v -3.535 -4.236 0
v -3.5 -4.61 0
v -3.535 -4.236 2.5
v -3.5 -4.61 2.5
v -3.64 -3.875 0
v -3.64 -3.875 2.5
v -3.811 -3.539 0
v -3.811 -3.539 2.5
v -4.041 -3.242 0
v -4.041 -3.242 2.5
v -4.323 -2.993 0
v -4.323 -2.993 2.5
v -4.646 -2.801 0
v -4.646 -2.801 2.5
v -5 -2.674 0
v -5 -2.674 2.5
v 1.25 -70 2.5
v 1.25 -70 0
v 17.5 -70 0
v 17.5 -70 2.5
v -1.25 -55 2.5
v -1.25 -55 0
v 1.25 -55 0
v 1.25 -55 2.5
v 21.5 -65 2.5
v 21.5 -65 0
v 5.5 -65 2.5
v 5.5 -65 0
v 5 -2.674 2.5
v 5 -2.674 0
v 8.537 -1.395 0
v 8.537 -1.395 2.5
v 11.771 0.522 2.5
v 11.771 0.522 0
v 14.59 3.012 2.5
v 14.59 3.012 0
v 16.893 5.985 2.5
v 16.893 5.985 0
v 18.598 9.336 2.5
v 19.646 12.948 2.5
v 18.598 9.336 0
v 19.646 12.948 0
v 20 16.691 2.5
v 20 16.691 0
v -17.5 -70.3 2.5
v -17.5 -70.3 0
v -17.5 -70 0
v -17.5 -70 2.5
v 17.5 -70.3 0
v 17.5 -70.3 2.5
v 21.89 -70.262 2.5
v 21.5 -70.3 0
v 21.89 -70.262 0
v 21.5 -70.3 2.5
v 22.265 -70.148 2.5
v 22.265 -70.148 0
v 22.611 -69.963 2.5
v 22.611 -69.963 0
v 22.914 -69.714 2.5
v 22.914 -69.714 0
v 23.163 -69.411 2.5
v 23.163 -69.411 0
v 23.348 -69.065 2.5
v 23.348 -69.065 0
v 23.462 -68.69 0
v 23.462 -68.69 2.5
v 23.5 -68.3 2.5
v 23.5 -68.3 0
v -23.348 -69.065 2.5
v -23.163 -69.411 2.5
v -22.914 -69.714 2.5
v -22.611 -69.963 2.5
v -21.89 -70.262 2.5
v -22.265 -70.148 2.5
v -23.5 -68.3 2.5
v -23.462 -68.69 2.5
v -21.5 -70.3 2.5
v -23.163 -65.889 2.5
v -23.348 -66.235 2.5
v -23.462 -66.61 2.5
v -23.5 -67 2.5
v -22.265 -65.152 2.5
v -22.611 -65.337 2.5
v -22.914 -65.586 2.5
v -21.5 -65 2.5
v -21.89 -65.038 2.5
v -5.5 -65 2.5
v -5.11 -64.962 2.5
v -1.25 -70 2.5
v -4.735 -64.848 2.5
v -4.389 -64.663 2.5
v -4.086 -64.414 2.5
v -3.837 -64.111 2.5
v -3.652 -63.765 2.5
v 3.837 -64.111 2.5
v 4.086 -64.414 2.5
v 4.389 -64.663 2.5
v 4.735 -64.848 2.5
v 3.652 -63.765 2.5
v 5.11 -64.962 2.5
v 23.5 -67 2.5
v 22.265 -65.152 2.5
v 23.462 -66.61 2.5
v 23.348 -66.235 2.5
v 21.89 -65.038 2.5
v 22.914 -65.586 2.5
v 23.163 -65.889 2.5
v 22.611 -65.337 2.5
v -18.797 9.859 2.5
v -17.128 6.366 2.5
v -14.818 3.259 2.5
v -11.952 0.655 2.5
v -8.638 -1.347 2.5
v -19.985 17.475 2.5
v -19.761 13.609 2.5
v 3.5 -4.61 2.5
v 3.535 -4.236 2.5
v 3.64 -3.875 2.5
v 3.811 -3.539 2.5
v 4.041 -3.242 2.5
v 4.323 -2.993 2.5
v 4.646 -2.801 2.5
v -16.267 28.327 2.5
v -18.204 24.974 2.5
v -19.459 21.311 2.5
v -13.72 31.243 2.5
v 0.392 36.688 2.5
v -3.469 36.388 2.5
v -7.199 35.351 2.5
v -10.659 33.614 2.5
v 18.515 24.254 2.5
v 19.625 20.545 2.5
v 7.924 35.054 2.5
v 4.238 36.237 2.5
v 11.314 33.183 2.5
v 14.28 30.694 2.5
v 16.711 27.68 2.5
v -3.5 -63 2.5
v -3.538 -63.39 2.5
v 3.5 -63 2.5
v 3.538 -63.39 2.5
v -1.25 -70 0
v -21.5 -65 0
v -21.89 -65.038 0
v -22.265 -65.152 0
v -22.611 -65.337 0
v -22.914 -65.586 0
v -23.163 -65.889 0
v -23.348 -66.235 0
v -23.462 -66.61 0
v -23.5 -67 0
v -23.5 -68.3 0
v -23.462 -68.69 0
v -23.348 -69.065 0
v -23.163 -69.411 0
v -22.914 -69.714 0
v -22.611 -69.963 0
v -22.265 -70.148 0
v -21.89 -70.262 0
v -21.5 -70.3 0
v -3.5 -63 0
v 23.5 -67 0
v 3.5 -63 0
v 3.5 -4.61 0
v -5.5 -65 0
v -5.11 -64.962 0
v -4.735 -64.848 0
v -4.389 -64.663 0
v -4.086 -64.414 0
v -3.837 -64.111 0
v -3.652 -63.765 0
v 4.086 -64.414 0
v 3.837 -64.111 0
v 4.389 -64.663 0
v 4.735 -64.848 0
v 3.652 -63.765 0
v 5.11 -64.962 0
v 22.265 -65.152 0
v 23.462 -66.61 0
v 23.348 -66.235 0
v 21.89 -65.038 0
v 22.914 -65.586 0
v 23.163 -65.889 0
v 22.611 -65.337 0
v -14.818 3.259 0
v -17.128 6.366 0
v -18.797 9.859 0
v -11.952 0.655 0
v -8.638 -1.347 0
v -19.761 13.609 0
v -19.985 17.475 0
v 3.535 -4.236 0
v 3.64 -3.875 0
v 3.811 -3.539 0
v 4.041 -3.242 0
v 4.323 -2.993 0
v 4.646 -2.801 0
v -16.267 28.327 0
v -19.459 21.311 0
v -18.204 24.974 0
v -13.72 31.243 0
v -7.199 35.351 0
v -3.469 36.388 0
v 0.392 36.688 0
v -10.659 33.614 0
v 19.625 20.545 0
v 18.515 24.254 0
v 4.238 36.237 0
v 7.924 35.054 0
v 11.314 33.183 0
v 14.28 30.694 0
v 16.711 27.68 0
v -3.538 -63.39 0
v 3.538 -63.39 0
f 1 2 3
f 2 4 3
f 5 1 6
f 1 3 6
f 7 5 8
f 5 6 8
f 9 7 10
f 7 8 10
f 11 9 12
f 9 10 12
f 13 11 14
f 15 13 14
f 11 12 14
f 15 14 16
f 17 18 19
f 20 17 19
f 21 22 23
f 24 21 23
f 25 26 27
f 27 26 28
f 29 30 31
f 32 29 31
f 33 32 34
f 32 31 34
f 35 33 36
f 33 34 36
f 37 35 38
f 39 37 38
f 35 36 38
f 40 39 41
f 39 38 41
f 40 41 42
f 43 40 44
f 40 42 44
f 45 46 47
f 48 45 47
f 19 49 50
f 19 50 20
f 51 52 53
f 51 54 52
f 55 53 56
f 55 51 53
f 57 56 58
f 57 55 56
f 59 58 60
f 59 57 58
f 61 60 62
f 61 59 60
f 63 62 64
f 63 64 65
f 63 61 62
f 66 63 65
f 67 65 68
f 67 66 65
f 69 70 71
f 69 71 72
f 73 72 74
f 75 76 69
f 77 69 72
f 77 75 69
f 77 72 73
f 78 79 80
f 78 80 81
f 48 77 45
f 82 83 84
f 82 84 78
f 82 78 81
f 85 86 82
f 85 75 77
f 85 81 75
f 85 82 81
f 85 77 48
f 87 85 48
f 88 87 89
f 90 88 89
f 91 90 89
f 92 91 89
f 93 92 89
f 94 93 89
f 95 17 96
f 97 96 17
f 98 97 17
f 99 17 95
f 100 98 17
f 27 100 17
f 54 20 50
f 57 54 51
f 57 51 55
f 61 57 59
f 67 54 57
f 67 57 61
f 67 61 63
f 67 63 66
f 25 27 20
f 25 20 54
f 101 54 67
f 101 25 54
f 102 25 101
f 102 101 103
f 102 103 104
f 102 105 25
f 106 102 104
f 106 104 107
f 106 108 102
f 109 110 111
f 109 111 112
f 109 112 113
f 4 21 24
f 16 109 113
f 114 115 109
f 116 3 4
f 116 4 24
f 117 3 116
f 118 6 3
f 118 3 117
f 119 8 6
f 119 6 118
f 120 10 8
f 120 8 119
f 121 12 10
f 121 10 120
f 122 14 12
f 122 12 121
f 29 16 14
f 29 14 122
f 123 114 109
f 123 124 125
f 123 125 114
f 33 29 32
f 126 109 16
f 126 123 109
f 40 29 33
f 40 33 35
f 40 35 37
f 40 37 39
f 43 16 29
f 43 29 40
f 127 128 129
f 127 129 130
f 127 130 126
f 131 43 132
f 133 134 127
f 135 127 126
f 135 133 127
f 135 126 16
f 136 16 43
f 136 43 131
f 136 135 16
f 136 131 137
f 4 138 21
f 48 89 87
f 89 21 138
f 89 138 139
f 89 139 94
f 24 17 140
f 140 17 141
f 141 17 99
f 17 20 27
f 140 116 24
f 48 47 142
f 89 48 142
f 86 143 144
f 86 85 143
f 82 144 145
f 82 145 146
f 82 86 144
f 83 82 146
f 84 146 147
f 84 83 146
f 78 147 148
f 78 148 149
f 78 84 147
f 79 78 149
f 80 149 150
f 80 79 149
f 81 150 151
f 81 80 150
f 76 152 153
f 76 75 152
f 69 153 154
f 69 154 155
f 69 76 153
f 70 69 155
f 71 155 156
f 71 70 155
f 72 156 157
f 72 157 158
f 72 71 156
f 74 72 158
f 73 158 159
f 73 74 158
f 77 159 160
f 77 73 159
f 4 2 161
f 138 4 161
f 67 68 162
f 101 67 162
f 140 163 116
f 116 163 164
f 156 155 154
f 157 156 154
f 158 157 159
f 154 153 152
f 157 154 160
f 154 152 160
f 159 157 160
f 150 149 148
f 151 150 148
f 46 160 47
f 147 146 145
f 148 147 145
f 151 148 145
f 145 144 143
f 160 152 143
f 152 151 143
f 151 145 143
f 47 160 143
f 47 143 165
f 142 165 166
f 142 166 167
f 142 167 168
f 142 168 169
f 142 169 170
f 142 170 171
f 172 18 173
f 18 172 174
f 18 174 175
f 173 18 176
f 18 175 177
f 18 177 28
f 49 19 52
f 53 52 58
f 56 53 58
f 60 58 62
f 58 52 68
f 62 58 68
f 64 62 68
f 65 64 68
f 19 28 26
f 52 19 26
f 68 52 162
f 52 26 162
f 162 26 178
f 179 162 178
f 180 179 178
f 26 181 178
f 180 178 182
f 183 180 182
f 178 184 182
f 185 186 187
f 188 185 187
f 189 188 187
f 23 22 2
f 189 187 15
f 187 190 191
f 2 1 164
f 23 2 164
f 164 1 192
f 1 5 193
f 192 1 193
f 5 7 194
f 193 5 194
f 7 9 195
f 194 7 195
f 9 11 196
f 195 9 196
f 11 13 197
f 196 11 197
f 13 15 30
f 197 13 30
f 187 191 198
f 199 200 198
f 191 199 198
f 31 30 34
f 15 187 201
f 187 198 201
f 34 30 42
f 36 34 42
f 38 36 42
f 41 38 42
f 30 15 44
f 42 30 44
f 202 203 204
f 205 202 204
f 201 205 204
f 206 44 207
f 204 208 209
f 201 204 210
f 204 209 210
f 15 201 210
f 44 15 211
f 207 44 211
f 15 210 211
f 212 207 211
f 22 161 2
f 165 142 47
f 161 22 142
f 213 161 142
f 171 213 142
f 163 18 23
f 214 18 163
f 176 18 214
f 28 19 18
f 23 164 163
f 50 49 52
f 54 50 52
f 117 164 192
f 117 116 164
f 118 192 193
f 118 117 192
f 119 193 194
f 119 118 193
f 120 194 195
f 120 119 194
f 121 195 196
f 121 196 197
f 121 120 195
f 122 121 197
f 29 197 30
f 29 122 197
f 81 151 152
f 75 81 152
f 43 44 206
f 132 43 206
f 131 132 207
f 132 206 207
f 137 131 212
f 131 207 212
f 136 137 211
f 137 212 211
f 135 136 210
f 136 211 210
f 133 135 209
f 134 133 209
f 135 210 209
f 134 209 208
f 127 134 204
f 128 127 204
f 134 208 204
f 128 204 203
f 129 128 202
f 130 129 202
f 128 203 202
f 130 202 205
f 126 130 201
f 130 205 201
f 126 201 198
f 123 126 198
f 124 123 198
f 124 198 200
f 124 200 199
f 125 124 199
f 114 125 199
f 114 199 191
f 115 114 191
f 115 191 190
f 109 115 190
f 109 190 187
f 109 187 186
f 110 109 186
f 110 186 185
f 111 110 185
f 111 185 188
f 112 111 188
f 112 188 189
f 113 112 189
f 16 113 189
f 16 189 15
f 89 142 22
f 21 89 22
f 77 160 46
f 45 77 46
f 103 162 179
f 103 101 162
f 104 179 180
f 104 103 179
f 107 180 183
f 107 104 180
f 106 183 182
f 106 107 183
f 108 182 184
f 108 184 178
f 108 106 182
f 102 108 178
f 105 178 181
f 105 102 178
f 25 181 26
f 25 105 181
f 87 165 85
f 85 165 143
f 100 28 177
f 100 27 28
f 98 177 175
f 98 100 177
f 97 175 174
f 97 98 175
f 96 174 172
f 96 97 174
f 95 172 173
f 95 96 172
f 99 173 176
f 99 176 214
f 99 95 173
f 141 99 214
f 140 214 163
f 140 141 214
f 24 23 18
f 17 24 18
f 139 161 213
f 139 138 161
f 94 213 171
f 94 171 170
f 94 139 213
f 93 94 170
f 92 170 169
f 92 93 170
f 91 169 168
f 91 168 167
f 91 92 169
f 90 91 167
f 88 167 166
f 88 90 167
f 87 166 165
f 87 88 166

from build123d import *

# Parameters (mm, degrees)
F0_W     = 6
F0_H     = 0.3
F1_DEPTH = 2.5
F2_R     = 2


# Not quite as in the source:
# - a feature names something its author has since deleted; it is built from what else it names


with BuildPart() as f1:
    # F0 (on Top) → F1 (new body)
    with BuildSketch(Plane.XY):
        with BuildLine():
            ThreePointArc((3.5, -3), (0, -3.3086313325), (-3.5, -3))
            Line((-3.5, -3), (-3.5, -65))
            Line((-3.5, -65), (-23.5, -65))
            Line((-23.5, -65), (-23.5, -70))
            Line((-23.5, -70), (-17.5, -70))
            Line((-17.5, -70), (-1.25, -70))
            Line((-1.25, -70), (-1.25, -55))
            Line((-1.25, -55), (1.25, -55))
            Line((1.25, -55), (1.25, -70))
            Line((1.25, -70), (17.5, -70))
            Line((17.5, -70), (23.5, -70))
            Line((23.5, -70), (23.5, -65))
            Line((23.5, -65), (3.5, -65))
            Line((3.5, -65), (3.5, -3))
        make_face()
        with BuildLine():
            ThreePointArc((20, 16.6913686675), (-12.8452325787, 32.0210783843), (-3.5, -3))
            ThreePointArc((-3.5, -3), (0, -3.3086313325), (3.5, -3))
            ThreePointArc((3.5, -3), (15.3297097168, 3.8461360889), (20, 16.6913686675))
        make_face()
        with Locations((-20.5, -70.15)):
            Rectangle(F0_W, F0_H)
        with Locations((20.5, -70.15)):
            Rectangle(F0_W, F0_H)
    extrude(amount=F1_DEPTH)

    # F2
    f2_edges = [f1.edges().sort_by_distance(p)[0] for p in [
        (-3.5, -3, 1.25),
        (3.5, -3, 1.25),
        (23.5, -65, 1.25),
        (-23.5, -65, 1.25),
        (-3.5, -65, 1.25),
        (3.5, -65, 1.25),
        (-23.5, -70.3, 1.25),
        (23.5, -70.3, 1.25),
    ]]
    fillet(f2_edges, radius=F2_R)


solid = f1.part
